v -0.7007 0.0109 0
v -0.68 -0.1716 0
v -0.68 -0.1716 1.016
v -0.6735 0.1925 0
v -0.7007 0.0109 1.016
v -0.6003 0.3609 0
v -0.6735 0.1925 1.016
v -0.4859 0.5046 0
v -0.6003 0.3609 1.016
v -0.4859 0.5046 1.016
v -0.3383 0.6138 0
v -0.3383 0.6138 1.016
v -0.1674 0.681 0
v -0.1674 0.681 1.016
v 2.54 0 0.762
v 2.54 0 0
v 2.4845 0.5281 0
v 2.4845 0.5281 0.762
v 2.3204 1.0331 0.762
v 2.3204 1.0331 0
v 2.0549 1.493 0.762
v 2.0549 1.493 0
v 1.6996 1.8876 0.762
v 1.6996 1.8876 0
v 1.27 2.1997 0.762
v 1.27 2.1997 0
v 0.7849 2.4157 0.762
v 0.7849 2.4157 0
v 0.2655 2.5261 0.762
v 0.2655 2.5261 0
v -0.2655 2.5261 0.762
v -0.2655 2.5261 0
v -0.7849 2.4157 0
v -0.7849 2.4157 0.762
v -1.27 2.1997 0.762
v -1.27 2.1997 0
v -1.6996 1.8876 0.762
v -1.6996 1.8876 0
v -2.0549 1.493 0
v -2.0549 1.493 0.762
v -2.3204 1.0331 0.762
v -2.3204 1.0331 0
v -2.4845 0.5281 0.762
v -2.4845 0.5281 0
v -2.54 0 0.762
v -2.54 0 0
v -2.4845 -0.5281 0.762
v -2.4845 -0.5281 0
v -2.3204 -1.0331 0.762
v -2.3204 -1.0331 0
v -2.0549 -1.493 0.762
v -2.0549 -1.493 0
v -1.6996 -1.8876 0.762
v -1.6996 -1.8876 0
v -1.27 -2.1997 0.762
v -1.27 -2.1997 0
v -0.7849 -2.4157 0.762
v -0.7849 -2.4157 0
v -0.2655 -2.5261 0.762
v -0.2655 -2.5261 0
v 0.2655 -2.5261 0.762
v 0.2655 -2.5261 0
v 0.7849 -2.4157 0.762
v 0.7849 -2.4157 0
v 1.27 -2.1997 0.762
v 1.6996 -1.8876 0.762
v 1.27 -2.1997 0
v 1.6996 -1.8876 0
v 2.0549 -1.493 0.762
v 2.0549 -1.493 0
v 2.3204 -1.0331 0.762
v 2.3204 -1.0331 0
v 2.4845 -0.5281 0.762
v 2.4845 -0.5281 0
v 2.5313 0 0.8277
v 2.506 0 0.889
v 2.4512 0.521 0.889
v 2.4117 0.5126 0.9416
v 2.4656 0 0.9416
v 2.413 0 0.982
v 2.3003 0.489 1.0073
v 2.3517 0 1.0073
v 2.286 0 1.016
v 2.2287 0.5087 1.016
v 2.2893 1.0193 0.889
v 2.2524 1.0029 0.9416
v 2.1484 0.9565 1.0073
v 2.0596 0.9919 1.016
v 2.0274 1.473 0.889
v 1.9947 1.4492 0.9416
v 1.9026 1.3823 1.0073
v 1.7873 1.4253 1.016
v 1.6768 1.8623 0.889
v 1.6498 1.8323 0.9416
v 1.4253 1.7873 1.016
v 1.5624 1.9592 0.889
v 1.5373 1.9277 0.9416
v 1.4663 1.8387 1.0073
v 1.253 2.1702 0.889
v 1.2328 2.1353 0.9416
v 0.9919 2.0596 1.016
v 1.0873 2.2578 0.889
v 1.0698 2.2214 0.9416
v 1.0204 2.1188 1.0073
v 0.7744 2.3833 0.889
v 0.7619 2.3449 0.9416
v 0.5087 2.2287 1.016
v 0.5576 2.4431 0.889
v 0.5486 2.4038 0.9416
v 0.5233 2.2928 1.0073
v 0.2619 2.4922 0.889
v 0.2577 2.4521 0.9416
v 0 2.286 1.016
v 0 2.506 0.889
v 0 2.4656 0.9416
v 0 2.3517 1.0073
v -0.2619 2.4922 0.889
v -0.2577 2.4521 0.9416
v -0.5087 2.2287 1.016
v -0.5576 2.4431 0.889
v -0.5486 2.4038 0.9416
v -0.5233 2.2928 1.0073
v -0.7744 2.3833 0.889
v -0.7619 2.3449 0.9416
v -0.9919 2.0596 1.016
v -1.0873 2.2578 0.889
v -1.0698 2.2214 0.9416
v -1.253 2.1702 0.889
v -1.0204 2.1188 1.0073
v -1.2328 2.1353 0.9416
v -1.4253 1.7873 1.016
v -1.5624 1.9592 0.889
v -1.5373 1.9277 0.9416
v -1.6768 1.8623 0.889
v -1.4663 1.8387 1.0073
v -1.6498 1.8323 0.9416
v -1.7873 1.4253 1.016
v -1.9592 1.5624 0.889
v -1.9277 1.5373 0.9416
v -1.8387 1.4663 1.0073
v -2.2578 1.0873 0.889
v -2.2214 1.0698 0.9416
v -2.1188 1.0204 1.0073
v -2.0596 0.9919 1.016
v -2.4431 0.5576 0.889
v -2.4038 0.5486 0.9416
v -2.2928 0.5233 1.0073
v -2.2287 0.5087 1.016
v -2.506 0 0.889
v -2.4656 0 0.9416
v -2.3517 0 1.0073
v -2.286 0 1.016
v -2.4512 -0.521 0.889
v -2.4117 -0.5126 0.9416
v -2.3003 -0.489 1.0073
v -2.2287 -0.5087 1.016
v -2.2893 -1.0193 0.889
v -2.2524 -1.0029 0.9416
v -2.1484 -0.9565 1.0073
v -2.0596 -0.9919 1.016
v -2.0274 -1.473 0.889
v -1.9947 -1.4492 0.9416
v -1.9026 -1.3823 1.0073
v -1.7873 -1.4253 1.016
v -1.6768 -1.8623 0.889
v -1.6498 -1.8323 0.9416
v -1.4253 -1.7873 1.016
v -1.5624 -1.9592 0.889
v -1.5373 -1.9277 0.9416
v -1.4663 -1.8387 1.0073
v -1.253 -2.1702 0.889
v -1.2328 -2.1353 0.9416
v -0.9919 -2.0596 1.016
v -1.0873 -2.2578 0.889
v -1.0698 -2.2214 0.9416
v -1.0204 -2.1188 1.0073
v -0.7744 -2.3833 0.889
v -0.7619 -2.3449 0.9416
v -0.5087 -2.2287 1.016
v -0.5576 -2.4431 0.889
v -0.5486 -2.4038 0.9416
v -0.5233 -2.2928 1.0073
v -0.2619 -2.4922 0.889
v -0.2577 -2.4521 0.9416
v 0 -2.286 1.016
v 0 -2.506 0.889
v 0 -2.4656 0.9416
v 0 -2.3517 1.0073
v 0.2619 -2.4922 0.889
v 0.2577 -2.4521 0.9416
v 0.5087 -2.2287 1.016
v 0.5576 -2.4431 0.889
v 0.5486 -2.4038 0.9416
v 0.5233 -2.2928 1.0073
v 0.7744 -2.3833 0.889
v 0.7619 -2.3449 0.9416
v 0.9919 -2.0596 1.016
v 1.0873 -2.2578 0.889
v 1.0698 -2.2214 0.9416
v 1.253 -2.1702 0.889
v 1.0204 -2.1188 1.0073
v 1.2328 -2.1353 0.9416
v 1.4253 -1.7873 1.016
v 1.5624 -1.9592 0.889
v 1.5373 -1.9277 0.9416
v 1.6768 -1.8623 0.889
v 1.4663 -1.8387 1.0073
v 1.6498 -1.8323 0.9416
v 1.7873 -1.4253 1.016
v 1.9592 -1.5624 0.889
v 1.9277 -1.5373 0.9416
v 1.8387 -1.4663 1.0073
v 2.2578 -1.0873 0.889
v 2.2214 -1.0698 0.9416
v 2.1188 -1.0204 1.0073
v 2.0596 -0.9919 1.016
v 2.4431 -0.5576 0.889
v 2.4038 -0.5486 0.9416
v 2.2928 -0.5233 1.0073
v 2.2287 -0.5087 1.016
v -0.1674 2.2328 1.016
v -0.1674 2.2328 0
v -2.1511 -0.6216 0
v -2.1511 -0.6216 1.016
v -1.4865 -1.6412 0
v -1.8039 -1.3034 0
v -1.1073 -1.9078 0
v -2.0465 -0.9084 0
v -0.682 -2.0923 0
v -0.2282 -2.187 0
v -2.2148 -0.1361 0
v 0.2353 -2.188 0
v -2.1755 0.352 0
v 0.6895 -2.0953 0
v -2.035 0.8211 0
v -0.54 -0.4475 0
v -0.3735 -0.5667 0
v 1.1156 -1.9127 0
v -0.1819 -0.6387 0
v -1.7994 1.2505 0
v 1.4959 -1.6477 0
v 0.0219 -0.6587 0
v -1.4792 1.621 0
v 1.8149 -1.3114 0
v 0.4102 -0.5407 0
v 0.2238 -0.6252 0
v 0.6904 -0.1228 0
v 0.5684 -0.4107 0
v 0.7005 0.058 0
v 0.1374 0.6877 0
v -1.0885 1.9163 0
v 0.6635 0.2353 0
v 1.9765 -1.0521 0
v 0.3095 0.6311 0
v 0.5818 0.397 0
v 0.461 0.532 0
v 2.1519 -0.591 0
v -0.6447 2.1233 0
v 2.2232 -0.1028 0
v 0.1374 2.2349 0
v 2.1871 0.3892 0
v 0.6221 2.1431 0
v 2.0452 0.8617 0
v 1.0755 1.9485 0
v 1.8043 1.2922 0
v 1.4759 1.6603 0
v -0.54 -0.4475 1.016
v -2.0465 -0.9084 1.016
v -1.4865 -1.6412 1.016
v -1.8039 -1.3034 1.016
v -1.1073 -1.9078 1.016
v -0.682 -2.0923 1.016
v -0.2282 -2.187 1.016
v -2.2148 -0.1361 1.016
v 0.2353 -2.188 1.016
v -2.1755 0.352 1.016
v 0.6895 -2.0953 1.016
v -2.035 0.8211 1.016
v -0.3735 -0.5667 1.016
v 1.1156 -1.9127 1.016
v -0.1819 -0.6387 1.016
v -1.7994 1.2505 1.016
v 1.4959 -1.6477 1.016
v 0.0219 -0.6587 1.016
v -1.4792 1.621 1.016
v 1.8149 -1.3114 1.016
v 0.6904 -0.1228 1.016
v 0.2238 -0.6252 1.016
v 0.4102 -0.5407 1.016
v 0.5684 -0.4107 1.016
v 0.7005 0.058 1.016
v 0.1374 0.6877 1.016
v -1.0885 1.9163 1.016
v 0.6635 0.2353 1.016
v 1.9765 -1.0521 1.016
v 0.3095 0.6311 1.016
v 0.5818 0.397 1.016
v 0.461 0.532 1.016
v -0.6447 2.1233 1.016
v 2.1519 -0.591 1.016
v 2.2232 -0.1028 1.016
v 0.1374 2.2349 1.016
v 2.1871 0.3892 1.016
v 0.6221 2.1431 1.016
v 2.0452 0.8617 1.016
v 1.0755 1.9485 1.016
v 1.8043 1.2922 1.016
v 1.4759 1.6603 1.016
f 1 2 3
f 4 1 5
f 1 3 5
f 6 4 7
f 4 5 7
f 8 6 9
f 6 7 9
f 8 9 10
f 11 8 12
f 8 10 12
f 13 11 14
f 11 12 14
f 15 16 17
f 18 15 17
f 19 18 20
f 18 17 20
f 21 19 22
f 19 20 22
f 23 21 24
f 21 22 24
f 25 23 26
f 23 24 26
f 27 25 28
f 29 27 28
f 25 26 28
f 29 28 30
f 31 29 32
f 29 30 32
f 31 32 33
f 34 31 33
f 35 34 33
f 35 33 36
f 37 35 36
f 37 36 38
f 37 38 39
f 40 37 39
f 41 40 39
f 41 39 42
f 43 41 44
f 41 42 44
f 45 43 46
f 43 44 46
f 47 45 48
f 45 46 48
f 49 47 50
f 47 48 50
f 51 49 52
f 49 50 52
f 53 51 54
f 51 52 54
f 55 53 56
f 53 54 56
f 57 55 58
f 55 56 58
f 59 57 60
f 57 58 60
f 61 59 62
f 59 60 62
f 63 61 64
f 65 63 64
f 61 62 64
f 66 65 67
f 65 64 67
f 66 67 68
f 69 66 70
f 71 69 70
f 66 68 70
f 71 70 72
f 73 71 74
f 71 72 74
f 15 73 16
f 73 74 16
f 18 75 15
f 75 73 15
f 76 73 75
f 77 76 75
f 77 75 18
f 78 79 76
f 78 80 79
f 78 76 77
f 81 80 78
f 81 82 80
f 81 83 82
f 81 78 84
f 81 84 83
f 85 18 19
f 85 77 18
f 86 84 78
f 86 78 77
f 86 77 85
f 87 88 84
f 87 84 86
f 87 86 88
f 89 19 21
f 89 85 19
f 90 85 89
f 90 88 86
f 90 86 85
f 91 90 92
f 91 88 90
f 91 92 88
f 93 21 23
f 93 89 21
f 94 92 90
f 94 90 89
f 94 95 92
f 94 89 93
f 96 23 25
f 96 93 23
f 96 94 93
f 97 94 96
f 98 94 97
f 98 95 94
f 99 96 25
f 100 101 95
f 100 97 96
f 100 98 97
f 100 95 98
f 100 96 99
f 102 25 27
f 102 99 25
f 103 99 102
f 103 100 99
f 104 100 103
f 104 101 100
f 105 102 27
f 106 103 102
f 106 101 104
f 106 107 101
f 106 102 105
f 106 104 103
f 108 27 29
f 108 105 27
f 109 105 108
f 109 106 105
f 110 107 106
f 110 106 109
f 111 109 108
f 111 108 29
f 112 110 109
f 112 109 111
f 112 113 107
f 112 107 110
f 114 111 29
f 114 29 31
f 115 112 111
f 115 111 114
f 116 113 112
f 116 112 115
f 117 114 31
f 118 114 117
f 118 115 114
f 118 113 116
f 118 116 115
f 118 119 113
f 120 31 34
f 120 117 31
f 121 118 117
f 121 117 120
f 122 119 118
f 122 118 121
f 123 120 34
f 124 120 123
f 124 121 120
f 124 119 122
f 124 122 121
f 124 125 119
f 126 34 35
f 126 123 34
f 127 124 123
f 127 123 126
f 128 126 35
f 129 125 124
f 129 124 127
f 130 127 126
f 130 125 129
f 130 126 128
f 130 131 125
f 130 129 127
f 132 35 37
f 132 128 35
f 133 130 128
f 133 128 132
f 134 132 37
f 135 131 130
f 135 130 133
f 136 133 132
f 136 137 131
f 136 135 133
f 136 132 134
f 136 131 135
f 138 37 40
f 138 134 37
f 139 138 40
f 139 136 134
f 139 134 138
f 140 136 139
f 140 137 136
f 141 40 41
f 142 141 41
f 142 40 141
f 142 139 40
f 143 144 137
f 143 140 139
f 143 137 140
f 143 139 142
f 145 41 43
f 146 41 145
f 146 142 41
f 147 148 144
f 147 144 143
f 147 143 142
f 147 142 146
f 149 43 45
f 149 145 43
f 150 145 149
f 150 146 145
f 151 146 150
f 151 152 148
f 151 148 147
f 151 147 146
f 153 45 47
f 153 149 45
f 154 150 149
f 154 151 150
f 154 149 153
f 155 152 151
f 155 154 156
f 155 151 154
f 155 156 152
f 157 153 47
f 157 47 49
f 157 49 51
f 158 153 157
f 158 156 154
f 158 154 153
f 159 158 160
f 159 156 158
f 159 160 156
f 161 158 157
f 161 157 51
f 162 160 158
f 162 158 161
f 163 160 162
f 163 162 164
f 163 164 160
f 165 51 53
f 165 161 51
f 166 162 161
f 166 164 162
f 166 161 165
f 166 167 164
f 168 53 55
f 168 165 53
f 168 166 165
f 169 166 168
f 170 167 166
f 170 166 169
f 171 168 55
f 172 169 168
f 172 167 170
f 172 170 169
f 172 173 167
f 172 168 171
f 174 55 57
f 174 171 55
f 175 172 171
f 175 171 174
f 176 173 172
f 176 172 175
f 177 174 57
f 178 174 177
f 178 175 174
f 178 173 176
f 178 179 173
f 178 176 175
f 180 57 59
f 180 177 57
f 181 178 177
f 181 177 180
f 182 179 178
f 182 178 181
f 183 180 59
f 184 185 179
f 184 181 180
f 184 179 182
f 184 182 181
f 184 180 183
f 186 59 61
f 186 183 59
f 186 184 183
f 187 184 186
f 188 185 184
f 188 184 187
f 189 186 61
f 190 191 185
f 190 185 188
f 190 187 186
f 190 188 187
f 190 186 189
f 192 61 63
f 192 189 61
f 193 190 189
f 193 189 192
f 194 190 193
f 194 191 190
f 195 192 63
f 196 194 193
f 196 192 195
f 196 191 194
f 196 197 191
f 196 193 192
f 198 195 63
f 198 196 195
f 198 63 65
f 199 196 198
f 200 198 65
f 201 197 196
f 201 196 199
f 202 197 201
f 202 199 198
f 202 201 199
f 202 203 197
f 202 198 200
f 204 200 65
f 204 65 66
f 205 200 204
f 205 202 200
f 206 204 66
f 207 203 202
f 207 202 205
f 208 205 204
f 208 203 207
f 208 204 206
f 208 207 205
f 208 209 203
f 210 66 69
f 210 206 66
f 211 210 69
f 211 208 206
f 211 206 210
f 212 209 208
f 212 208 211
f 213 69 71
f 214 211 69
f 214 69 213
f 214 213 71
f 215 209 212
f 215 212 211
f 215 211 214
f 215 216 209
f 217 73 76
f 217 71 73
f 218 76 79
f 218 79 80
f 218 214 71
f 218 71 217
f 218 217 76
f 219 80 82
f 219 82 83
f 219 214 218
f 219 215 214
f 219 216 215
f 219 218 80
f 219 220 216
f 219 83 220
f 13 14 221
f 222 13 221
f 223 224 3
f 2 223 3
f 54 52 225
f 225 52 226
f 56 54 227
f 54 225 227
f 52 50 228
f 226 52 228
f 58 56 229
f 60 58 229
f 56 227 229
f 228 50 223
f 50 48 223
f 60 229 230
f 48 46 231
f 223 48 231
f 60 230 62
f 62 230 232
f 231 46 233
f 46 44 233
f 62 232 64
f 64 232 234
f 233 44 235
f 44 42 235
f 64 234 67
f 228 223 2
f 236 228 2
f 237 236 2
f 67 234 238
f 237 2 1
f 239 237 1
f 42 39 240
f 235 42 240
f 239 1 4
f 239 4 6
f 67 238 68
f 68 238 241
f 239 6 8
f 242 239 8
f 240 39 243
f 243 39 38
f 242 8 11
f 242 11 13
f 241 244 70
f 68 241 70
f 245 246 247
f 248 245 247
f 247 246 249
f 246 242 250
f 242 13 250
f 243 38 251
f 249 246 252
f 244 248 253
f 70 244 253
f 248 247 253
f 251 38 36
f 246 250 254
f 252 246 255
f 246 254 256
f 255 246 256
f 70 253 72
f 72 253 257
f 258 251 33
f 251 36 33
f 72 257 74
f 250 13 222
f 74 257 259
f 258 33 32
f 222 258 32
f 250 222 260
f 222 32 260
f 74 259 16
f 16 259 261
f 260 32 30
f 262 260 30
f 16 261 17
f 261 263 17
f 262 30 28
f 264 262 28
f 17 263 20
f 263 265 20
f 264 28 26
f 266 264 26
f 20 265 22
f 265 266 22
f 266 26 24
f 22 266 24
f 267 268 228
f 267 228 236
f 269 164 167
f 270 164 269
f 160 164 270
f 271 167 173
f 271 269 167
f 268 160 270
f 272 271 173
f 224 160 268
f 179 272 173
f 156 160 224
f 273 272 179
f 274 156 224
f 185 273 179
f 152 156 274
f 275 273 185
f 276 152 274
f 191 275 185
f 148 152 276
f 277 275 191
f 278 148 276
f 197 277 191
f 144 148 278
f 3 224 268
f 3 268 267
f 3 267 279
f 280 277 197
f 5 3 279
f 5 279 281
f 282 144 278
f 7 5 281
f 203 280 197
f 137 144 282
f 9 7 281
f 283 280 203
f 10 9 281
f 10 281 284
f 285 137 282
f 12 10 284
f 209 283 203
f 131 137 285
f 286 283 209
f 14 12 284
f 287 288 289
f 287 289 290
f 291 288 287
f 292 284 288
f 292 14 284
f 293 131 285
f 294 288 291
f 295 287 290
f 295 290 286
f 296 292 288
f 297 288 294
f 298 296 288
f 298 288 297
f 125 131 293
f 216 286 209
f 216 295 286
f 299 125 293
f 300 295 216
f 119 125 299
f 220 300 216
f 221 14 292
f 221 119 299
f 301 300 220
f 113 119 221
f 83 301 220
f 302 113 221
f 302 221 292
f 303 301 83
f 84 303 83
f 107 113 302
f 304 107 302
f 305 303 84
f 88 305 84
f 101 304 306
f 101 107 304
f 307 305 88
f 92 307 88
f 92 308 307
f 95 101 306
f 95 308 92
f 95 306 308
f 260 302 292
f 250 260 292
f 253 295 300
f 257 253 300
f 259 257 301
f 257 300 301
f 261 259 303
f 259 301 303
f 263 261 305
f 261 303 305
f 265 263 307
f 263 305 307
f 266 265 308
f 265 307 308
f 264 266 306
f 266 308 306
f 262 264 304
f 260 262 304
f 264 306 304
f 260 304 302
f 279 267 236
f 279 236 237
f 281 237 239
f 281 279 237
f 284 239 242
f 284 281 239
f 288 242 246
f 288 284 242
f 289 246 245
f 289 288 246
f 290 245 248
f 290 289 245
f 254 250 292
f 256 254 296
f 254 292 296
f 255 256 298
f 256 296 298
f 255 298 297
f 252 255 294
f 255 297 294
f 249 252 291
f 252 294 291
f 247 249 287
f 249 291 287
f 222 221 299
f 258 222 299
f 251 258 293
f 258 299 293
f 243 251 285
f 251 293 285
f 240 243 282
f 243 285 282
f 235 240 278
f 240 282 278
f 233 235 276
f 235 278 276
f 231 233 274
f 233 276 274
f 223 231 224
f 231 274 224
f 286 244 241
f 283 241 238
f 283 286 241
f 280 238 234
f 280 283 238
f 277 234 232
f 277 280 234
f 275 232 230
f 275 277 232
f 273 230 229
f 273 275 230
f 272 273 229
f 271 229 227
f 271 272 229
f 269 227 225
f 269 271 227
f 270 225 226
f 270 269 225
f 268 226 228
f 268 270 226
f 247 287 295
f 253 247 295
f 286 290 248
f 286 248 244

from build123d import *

# Parameters (mm, degrees)
SKETCH1_R           = 2.54
BOSS_EXTRUDE3_DEPTH = 1.016
FILLET1_R           = 0.254
CUT_EXTRUDE1_DEPTH  = 11.176


with BuildPart() as part:
    # Sketch1 → Boss-Extrude3 (new body)
    with BuildSketch(Plane.XY):
        Circle(SKETCH1_R)
    extrude(amount=BOSS_EXTRUDE3_DEPTH)

    # Fillet1
    fillet1_edges = [part.edges().sort_by_distance(p)[0] for p in [
        (-2.54, 0, 1.016),
    ]]
    fillet(fillet1_edges, radius=FILLET1_R)

    # Sketch3 → Cut-Extrude1 (cut)
    with BuildSketch(Plane.XY.offset(1.016)):
        with BuildLine():
            Line((-2.151072182, -0.621624482), (-0.679971736, -0.171586714))
            ThreePointArc((-0.679971736, -0.171586714), (-0.600265463, 0.360870926), (-0.167400209, 0.681014488))
            Line((-0.167400209, 0.681014488), (-0.167400209, 2.232824601))
            ThreePointArc((-0.167400209, 2.232824601), (-1.799371166, 1.250455709), (-2.151072182, -0.621624482))
        make_face()
        with BuildLine():
            Line((-2.046546593, -0.90839175), (-0.539954253, -0.447496333))
            ThreePointArc((-0.539954253, -0.447496333), (0.02185151, -0.658663896), (0.568426191, -0.410725247))
            Line((0.568426191, -0.410725247), (1.814888674, -1.311376236))
            ThreePointArc((1.814888674, -1.311376236), (-0.228235226, -2.186971416), (-2.046546593, -0.90839175))
        make_face()
        with BuildLine():
            Line((0.69044324, -0.122848261), (1.976507953, -1.052114462))
            ThreePointArc((1.976507953, -1.052114462), (1.936551374, 1.083523834), (0.137399791, 2.234871322))
            Line((0.137399791, 2.234871322), (0.137399791, 0.687695325))
            ThreePointArc((0.137399791, 0.687695325), (0.581790588, 0.39696258), (0.69044324, -0.122848261))
        make_face()
    extrude(amount=-CUT_EXTRUDE1_DEPTH, mode=Mode.SUBTRACT)


solid = part.part
